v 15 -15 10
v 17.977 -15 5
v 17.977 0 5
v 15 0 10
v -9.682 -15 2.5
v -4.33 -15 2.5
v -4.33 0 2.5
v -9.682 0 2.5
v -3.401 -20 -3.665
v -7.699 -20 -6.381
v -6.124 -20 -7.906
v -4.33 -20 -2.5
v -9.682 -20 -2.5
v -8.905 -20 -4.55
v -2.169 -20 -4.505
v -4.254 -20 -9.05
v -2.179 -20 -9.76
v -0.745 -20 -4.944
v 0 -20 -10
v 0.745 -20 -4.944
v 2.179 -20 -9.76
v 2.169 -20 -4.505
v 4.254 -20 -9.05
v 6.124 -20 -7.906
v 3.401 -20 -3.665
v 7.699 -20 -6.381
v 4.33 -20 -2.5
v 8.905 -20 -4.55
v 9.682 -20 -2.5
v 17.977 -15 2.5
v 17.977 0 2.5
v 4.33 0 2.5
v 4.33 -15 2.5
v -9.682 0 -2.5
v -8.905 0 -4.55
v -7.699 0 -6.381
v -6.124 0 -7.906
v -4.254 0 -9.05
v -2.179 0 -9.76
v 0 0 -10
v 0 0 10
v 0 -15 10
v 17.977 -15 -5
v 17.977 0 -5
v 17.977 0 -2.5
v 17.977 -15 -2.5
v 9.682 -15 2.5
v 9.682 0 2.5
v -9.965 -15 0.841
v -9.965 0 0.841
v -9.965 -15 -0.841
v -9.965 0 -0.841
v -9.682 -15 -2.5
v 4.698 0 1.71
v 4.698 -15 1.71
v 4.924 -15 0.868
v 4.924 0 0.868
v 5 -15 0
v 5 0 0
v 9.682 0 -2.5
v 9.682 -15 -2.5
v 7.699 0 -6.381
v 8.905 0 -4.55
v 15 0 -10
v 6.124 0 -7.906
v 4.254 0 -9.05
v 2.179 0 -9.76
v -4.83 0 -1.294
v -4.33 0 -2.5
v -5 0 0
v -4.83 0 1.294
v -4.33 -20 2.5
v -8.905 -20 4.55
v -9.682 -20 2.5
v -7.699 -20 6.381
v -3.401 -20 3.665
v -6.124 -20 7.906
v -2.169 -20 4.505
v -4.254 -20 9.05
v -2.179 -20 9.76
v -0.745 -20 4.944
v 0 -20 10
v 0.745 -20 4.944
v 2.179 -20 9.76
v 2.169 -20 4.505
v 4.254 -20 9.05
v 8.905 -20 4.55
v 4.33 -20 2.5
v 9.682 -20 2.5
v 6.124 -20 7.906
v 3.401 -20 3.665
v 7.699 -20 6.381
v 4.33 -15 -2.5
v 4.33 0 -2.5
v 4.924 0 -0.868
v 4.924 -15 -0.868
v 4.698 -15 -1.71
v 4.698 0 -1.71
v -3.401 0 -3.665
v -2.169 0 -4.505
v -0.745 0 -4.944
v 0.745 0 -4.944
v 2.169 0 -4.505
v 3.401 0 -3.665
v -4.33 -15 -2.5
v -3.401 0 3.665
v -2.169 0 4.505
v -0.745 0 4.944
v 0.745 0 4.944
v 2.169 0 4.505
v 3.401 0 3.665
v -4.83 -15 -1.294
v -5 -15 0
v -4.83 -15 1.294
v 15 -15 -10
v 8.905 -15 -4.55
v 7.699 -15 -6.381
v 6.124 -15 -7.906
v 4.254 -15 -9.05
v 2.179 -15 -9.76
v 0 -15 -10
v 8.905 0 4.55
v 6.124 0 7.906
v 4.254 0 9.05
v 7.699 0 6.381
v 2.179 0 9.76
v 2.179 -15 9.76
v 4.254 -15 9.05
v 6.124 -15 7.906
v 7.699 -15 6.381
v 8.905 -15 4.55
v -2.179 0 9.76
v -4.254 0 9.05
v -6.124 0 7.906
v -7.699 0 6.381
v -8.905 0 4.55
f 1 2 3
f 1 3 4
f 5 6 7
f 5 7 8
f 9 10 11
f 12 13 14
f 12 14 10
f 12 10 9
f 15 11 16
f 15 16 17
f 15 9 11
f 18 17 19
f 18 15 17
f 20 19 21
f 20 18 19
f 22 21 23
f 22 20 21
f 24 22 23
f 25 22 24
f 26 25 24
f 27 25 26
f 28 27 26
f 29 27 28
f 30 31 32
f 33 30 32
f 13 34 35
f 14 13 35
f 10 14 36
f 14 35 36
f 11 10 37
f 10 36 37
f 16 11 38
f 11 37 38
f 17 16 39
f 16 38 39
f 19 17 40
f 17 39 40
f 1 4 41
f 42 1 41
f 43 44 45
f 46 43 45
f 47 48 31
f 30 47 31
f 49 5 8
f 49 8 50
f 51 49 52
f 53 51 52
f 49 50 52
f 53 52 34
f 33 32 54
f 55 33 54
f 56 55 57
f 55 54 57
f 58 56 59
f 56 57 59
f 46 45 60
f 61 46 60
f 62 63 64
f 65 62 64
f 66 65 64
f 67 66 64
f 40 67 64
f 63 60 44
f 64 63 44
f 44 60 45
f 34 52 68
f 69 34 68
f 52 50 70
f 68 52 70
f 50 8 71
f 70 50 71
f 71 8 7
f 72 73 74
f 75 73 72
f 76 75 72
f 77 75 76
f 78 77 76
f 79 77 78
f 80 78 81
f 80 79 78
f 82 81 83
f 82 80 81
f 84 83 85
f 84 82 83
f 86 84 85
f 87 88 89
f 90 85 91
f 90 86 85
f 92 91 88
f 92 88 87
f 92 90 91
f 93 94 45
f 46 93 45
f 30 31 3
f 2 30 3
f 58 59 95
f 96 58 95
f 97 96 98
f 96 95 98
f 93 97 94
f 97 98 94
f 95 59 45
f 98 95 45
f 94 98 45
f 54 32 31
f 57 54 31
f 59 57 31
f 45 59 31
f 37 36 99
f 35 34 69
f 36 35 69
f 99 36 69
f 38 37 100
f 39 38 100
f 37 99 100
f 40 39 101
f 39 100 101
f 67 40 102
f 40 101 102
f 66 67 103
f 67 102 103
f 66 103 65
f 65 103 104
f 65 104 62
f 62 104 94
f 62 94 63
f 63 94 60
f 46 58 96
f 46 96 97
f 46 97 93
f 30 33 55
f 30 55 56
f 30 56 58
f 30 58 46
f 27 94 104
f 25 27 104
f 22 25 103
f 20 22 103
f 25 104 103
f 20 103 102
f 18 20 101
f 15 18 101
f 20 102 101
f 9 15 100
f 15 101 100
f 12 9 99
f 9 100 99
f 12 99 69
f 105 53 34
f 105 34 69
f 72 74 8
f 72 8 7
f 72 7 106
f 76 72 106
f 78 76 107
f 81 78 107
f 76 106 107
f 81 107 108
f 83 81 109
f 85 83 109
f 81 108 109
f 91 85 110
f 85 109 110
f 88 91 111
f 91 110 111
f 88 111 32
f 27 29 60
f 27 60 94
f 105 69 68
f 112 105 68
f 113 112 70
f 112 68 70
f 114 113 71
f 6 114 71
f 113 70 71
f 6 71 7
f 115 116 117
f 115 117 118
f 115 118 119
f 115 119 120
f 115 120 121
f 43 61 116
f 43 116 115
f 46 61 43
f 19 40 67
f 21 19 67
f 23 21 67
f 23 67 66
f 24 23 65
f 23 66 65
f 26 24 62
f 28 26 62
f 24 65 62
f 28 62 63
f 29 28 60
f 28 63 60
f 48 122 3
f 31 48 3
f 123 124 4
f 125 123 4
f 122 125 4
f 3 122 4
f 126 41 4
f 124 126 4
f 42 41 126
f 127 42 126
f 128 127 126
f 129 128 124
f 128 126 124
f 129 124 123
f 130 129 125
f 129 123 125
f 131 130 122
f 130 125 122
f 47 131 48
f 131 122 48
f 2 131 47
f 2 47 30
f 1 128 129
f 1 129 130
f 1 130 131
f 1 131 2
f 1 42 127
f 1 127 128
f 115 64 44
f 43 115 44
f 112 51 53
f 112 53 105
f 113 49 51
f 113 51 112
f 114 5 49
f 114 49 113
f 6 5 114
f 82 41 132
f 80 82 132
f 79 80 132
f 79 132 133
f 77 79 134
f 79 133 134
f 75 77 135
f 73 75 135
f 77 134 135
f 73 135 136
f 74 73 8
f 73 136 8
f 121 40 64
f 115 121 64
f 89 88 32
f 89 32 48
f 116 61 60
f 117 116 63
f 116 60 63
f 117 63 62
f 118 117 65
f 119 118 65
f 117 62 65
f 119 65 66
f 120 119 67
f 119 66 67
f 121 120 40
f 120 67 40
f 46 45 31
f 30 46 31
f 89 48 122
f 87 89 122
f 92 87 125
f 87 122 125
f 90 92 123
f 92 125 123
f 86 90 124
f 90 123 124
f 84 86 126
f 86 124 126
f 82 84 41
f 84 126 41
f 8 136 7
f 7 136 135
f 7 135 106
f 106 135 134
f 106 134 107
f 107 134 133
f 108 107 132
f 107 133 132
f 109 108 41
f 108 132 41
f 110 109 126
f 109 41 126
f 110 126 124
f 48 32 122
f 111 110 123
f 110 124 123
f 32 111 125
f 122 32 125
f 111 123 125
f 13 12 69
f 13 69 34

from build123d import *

# Parameters (mm, degrees)
F1_DEPTH = 20
F2_DEPTH = 15
F3_DEPTH = 15


with BuildPart() as f1:
    # F0 (on Front) → F1 (new body)
    with BuildSketch(Plane.XZ):
        with BuildLine():
            ThreePointArc((9.6824583655, 2.5), (6.123724357, 7.9056941504), (0, 10))
            ThreePointArc((0, 10), (-6.123724357, 7.9056941504), (-9.6824583655, 2.5))
            Line((-9.6824583655, 2.5), (-4.3301270189, 2.5))
            ThreePointArc((-4.3301270189, 2.5), (0, 5), (4.3301270189, 2.5))
            Line((4.3301270189, 2.5), (9.6824583655, 2.5))
        make_face()
    extrude(amount=F1_DEPTH)


with BuildPart() as f1b:
    # F0 (on Front) → F1, piece 2 (new body)
    with BuildSketch(Plane.XZ):
        with BuildLine():
            Line((-4.3301270189, -2.5), (-9.6824583655, -2.5))
            ThreePointArc((-9.6824583655, -2.5), (-6.123724357, -7.9056941504), (0, -10))
            ThreePointArc((0, -10), (6.123724357, -7.9056941504), (9.6824583655, -2.5))
            Line((9.6824583655, -2.5), (4.3301270189, -2.5))
            ThreePointArc((4.3301270189, -2.5), (0, -5), (-4.3301270189, -2.5))
        make_face()
    extrude(amount=F1_DEPTH)


with BuildPart() as f2:
    # F0 (on Front) → F2 (new body)
    with BuildSketch(Plane.XZ):
        with BuildLine():
            Line((15, 10), (0, 10))
            ThreePointArc((0, 10), (6.123724357, 7.9056941504), (9.6824583655, 2.5))
            Line((9.6824583655, 2.5), (17.9773463092, 2.5))
            Line((17.9773463092, 2.5), (17.9773463092, 5))
            Line((17.9773463092, 5), (15, 10))
        make_face()
    extrude(amount=F2_DEPTH)


with BuildPart() as f2b:
    # F0 (on Front) → F2, piece 2 (new body)
    with BuildSketch(Plane.XZ):
        with BuildLine():
            ThreePointArc((9.6824583655, -2.5), (6.123724357, -7.9056941504), (0, -10))
            Line((0, -10), (15, -10))
            Line((15, -10), (17.9773463092, -5))
            Line((17.9773463092, -5), (17.9773463092, -2.5))
            Line((17.9773463092, -2.5), (9.6824583655, -2.5))
        make_face()
    extrude(amount=F2_DEPTH)


with BuildPart() as f3:
    # F0 (on Front) → F3 (new body)
    with BuildSketch(Plane.XZ):
        with BuildLine():
            Line((17.9773463092, 2.5), (9.6824583655, 2.5))
            ThreePointArc((9.6824583655, 2.5), (9.9202969627, 1.2600429248), (10, 0))
            ThreePointArc((10, 0), (9.9202969627, -1.2600429248), (9.6824583655, -2.5))
            Line((9.6824583655, -2.5), (17.9773463092, -2.5))
            Line((17.9773463092, -2.5), (17.9773463092, 2.5))
        make_face()
        with BuildLine():
            ThreePointArc((10, 0), (9.9202969627, 1.2600429248), (9.6824583655, 2.5))
            Line((9.6824583655, 2.5), (4.3301270189, 2.5))
            ThreePointArc((4.3301270189, 2.5), (4.8296291314, 1.2940952255), (5, 0))
            ThreePointArc((5, 0), (4.8296291314, -1.2940952255), (4.3301270189, -2.5))
            Line((4.3301270189, -2.5), (9.6824583655, -2.5))
            ThreePointArc((9.6824583655, -2.5), (9.9202969627, -1.2600429248), (10, 0))
        make_face()
    extrude(amount=F3_DEPTH)


with BuildPart() as f3b:
    # F0 (on Front) → F3, piece 2 (new body)
    with BuildSketch(Plane.XZ):
        with BuildLine():
            Line((-4.3301270189, 2.5), (-9.6824583655, 2.5))
            ThreePointArc((-9.6824583655, 2.5), (-10, 0), (-9.6824583655, -2.5))
            Line((-9.6824583655, -2.5), (-4.3301270189, -2.5))
            ThreePointArc((-4.3301270189, -2.5), (-5, 0), (-4.3301270189, 2.5))
        make_face()
    extrude(amount=F3_DEPTH)


solid = Compound([f1.part, f1b.part, f2.part, f2b.part, f3.part, f3b.part])
